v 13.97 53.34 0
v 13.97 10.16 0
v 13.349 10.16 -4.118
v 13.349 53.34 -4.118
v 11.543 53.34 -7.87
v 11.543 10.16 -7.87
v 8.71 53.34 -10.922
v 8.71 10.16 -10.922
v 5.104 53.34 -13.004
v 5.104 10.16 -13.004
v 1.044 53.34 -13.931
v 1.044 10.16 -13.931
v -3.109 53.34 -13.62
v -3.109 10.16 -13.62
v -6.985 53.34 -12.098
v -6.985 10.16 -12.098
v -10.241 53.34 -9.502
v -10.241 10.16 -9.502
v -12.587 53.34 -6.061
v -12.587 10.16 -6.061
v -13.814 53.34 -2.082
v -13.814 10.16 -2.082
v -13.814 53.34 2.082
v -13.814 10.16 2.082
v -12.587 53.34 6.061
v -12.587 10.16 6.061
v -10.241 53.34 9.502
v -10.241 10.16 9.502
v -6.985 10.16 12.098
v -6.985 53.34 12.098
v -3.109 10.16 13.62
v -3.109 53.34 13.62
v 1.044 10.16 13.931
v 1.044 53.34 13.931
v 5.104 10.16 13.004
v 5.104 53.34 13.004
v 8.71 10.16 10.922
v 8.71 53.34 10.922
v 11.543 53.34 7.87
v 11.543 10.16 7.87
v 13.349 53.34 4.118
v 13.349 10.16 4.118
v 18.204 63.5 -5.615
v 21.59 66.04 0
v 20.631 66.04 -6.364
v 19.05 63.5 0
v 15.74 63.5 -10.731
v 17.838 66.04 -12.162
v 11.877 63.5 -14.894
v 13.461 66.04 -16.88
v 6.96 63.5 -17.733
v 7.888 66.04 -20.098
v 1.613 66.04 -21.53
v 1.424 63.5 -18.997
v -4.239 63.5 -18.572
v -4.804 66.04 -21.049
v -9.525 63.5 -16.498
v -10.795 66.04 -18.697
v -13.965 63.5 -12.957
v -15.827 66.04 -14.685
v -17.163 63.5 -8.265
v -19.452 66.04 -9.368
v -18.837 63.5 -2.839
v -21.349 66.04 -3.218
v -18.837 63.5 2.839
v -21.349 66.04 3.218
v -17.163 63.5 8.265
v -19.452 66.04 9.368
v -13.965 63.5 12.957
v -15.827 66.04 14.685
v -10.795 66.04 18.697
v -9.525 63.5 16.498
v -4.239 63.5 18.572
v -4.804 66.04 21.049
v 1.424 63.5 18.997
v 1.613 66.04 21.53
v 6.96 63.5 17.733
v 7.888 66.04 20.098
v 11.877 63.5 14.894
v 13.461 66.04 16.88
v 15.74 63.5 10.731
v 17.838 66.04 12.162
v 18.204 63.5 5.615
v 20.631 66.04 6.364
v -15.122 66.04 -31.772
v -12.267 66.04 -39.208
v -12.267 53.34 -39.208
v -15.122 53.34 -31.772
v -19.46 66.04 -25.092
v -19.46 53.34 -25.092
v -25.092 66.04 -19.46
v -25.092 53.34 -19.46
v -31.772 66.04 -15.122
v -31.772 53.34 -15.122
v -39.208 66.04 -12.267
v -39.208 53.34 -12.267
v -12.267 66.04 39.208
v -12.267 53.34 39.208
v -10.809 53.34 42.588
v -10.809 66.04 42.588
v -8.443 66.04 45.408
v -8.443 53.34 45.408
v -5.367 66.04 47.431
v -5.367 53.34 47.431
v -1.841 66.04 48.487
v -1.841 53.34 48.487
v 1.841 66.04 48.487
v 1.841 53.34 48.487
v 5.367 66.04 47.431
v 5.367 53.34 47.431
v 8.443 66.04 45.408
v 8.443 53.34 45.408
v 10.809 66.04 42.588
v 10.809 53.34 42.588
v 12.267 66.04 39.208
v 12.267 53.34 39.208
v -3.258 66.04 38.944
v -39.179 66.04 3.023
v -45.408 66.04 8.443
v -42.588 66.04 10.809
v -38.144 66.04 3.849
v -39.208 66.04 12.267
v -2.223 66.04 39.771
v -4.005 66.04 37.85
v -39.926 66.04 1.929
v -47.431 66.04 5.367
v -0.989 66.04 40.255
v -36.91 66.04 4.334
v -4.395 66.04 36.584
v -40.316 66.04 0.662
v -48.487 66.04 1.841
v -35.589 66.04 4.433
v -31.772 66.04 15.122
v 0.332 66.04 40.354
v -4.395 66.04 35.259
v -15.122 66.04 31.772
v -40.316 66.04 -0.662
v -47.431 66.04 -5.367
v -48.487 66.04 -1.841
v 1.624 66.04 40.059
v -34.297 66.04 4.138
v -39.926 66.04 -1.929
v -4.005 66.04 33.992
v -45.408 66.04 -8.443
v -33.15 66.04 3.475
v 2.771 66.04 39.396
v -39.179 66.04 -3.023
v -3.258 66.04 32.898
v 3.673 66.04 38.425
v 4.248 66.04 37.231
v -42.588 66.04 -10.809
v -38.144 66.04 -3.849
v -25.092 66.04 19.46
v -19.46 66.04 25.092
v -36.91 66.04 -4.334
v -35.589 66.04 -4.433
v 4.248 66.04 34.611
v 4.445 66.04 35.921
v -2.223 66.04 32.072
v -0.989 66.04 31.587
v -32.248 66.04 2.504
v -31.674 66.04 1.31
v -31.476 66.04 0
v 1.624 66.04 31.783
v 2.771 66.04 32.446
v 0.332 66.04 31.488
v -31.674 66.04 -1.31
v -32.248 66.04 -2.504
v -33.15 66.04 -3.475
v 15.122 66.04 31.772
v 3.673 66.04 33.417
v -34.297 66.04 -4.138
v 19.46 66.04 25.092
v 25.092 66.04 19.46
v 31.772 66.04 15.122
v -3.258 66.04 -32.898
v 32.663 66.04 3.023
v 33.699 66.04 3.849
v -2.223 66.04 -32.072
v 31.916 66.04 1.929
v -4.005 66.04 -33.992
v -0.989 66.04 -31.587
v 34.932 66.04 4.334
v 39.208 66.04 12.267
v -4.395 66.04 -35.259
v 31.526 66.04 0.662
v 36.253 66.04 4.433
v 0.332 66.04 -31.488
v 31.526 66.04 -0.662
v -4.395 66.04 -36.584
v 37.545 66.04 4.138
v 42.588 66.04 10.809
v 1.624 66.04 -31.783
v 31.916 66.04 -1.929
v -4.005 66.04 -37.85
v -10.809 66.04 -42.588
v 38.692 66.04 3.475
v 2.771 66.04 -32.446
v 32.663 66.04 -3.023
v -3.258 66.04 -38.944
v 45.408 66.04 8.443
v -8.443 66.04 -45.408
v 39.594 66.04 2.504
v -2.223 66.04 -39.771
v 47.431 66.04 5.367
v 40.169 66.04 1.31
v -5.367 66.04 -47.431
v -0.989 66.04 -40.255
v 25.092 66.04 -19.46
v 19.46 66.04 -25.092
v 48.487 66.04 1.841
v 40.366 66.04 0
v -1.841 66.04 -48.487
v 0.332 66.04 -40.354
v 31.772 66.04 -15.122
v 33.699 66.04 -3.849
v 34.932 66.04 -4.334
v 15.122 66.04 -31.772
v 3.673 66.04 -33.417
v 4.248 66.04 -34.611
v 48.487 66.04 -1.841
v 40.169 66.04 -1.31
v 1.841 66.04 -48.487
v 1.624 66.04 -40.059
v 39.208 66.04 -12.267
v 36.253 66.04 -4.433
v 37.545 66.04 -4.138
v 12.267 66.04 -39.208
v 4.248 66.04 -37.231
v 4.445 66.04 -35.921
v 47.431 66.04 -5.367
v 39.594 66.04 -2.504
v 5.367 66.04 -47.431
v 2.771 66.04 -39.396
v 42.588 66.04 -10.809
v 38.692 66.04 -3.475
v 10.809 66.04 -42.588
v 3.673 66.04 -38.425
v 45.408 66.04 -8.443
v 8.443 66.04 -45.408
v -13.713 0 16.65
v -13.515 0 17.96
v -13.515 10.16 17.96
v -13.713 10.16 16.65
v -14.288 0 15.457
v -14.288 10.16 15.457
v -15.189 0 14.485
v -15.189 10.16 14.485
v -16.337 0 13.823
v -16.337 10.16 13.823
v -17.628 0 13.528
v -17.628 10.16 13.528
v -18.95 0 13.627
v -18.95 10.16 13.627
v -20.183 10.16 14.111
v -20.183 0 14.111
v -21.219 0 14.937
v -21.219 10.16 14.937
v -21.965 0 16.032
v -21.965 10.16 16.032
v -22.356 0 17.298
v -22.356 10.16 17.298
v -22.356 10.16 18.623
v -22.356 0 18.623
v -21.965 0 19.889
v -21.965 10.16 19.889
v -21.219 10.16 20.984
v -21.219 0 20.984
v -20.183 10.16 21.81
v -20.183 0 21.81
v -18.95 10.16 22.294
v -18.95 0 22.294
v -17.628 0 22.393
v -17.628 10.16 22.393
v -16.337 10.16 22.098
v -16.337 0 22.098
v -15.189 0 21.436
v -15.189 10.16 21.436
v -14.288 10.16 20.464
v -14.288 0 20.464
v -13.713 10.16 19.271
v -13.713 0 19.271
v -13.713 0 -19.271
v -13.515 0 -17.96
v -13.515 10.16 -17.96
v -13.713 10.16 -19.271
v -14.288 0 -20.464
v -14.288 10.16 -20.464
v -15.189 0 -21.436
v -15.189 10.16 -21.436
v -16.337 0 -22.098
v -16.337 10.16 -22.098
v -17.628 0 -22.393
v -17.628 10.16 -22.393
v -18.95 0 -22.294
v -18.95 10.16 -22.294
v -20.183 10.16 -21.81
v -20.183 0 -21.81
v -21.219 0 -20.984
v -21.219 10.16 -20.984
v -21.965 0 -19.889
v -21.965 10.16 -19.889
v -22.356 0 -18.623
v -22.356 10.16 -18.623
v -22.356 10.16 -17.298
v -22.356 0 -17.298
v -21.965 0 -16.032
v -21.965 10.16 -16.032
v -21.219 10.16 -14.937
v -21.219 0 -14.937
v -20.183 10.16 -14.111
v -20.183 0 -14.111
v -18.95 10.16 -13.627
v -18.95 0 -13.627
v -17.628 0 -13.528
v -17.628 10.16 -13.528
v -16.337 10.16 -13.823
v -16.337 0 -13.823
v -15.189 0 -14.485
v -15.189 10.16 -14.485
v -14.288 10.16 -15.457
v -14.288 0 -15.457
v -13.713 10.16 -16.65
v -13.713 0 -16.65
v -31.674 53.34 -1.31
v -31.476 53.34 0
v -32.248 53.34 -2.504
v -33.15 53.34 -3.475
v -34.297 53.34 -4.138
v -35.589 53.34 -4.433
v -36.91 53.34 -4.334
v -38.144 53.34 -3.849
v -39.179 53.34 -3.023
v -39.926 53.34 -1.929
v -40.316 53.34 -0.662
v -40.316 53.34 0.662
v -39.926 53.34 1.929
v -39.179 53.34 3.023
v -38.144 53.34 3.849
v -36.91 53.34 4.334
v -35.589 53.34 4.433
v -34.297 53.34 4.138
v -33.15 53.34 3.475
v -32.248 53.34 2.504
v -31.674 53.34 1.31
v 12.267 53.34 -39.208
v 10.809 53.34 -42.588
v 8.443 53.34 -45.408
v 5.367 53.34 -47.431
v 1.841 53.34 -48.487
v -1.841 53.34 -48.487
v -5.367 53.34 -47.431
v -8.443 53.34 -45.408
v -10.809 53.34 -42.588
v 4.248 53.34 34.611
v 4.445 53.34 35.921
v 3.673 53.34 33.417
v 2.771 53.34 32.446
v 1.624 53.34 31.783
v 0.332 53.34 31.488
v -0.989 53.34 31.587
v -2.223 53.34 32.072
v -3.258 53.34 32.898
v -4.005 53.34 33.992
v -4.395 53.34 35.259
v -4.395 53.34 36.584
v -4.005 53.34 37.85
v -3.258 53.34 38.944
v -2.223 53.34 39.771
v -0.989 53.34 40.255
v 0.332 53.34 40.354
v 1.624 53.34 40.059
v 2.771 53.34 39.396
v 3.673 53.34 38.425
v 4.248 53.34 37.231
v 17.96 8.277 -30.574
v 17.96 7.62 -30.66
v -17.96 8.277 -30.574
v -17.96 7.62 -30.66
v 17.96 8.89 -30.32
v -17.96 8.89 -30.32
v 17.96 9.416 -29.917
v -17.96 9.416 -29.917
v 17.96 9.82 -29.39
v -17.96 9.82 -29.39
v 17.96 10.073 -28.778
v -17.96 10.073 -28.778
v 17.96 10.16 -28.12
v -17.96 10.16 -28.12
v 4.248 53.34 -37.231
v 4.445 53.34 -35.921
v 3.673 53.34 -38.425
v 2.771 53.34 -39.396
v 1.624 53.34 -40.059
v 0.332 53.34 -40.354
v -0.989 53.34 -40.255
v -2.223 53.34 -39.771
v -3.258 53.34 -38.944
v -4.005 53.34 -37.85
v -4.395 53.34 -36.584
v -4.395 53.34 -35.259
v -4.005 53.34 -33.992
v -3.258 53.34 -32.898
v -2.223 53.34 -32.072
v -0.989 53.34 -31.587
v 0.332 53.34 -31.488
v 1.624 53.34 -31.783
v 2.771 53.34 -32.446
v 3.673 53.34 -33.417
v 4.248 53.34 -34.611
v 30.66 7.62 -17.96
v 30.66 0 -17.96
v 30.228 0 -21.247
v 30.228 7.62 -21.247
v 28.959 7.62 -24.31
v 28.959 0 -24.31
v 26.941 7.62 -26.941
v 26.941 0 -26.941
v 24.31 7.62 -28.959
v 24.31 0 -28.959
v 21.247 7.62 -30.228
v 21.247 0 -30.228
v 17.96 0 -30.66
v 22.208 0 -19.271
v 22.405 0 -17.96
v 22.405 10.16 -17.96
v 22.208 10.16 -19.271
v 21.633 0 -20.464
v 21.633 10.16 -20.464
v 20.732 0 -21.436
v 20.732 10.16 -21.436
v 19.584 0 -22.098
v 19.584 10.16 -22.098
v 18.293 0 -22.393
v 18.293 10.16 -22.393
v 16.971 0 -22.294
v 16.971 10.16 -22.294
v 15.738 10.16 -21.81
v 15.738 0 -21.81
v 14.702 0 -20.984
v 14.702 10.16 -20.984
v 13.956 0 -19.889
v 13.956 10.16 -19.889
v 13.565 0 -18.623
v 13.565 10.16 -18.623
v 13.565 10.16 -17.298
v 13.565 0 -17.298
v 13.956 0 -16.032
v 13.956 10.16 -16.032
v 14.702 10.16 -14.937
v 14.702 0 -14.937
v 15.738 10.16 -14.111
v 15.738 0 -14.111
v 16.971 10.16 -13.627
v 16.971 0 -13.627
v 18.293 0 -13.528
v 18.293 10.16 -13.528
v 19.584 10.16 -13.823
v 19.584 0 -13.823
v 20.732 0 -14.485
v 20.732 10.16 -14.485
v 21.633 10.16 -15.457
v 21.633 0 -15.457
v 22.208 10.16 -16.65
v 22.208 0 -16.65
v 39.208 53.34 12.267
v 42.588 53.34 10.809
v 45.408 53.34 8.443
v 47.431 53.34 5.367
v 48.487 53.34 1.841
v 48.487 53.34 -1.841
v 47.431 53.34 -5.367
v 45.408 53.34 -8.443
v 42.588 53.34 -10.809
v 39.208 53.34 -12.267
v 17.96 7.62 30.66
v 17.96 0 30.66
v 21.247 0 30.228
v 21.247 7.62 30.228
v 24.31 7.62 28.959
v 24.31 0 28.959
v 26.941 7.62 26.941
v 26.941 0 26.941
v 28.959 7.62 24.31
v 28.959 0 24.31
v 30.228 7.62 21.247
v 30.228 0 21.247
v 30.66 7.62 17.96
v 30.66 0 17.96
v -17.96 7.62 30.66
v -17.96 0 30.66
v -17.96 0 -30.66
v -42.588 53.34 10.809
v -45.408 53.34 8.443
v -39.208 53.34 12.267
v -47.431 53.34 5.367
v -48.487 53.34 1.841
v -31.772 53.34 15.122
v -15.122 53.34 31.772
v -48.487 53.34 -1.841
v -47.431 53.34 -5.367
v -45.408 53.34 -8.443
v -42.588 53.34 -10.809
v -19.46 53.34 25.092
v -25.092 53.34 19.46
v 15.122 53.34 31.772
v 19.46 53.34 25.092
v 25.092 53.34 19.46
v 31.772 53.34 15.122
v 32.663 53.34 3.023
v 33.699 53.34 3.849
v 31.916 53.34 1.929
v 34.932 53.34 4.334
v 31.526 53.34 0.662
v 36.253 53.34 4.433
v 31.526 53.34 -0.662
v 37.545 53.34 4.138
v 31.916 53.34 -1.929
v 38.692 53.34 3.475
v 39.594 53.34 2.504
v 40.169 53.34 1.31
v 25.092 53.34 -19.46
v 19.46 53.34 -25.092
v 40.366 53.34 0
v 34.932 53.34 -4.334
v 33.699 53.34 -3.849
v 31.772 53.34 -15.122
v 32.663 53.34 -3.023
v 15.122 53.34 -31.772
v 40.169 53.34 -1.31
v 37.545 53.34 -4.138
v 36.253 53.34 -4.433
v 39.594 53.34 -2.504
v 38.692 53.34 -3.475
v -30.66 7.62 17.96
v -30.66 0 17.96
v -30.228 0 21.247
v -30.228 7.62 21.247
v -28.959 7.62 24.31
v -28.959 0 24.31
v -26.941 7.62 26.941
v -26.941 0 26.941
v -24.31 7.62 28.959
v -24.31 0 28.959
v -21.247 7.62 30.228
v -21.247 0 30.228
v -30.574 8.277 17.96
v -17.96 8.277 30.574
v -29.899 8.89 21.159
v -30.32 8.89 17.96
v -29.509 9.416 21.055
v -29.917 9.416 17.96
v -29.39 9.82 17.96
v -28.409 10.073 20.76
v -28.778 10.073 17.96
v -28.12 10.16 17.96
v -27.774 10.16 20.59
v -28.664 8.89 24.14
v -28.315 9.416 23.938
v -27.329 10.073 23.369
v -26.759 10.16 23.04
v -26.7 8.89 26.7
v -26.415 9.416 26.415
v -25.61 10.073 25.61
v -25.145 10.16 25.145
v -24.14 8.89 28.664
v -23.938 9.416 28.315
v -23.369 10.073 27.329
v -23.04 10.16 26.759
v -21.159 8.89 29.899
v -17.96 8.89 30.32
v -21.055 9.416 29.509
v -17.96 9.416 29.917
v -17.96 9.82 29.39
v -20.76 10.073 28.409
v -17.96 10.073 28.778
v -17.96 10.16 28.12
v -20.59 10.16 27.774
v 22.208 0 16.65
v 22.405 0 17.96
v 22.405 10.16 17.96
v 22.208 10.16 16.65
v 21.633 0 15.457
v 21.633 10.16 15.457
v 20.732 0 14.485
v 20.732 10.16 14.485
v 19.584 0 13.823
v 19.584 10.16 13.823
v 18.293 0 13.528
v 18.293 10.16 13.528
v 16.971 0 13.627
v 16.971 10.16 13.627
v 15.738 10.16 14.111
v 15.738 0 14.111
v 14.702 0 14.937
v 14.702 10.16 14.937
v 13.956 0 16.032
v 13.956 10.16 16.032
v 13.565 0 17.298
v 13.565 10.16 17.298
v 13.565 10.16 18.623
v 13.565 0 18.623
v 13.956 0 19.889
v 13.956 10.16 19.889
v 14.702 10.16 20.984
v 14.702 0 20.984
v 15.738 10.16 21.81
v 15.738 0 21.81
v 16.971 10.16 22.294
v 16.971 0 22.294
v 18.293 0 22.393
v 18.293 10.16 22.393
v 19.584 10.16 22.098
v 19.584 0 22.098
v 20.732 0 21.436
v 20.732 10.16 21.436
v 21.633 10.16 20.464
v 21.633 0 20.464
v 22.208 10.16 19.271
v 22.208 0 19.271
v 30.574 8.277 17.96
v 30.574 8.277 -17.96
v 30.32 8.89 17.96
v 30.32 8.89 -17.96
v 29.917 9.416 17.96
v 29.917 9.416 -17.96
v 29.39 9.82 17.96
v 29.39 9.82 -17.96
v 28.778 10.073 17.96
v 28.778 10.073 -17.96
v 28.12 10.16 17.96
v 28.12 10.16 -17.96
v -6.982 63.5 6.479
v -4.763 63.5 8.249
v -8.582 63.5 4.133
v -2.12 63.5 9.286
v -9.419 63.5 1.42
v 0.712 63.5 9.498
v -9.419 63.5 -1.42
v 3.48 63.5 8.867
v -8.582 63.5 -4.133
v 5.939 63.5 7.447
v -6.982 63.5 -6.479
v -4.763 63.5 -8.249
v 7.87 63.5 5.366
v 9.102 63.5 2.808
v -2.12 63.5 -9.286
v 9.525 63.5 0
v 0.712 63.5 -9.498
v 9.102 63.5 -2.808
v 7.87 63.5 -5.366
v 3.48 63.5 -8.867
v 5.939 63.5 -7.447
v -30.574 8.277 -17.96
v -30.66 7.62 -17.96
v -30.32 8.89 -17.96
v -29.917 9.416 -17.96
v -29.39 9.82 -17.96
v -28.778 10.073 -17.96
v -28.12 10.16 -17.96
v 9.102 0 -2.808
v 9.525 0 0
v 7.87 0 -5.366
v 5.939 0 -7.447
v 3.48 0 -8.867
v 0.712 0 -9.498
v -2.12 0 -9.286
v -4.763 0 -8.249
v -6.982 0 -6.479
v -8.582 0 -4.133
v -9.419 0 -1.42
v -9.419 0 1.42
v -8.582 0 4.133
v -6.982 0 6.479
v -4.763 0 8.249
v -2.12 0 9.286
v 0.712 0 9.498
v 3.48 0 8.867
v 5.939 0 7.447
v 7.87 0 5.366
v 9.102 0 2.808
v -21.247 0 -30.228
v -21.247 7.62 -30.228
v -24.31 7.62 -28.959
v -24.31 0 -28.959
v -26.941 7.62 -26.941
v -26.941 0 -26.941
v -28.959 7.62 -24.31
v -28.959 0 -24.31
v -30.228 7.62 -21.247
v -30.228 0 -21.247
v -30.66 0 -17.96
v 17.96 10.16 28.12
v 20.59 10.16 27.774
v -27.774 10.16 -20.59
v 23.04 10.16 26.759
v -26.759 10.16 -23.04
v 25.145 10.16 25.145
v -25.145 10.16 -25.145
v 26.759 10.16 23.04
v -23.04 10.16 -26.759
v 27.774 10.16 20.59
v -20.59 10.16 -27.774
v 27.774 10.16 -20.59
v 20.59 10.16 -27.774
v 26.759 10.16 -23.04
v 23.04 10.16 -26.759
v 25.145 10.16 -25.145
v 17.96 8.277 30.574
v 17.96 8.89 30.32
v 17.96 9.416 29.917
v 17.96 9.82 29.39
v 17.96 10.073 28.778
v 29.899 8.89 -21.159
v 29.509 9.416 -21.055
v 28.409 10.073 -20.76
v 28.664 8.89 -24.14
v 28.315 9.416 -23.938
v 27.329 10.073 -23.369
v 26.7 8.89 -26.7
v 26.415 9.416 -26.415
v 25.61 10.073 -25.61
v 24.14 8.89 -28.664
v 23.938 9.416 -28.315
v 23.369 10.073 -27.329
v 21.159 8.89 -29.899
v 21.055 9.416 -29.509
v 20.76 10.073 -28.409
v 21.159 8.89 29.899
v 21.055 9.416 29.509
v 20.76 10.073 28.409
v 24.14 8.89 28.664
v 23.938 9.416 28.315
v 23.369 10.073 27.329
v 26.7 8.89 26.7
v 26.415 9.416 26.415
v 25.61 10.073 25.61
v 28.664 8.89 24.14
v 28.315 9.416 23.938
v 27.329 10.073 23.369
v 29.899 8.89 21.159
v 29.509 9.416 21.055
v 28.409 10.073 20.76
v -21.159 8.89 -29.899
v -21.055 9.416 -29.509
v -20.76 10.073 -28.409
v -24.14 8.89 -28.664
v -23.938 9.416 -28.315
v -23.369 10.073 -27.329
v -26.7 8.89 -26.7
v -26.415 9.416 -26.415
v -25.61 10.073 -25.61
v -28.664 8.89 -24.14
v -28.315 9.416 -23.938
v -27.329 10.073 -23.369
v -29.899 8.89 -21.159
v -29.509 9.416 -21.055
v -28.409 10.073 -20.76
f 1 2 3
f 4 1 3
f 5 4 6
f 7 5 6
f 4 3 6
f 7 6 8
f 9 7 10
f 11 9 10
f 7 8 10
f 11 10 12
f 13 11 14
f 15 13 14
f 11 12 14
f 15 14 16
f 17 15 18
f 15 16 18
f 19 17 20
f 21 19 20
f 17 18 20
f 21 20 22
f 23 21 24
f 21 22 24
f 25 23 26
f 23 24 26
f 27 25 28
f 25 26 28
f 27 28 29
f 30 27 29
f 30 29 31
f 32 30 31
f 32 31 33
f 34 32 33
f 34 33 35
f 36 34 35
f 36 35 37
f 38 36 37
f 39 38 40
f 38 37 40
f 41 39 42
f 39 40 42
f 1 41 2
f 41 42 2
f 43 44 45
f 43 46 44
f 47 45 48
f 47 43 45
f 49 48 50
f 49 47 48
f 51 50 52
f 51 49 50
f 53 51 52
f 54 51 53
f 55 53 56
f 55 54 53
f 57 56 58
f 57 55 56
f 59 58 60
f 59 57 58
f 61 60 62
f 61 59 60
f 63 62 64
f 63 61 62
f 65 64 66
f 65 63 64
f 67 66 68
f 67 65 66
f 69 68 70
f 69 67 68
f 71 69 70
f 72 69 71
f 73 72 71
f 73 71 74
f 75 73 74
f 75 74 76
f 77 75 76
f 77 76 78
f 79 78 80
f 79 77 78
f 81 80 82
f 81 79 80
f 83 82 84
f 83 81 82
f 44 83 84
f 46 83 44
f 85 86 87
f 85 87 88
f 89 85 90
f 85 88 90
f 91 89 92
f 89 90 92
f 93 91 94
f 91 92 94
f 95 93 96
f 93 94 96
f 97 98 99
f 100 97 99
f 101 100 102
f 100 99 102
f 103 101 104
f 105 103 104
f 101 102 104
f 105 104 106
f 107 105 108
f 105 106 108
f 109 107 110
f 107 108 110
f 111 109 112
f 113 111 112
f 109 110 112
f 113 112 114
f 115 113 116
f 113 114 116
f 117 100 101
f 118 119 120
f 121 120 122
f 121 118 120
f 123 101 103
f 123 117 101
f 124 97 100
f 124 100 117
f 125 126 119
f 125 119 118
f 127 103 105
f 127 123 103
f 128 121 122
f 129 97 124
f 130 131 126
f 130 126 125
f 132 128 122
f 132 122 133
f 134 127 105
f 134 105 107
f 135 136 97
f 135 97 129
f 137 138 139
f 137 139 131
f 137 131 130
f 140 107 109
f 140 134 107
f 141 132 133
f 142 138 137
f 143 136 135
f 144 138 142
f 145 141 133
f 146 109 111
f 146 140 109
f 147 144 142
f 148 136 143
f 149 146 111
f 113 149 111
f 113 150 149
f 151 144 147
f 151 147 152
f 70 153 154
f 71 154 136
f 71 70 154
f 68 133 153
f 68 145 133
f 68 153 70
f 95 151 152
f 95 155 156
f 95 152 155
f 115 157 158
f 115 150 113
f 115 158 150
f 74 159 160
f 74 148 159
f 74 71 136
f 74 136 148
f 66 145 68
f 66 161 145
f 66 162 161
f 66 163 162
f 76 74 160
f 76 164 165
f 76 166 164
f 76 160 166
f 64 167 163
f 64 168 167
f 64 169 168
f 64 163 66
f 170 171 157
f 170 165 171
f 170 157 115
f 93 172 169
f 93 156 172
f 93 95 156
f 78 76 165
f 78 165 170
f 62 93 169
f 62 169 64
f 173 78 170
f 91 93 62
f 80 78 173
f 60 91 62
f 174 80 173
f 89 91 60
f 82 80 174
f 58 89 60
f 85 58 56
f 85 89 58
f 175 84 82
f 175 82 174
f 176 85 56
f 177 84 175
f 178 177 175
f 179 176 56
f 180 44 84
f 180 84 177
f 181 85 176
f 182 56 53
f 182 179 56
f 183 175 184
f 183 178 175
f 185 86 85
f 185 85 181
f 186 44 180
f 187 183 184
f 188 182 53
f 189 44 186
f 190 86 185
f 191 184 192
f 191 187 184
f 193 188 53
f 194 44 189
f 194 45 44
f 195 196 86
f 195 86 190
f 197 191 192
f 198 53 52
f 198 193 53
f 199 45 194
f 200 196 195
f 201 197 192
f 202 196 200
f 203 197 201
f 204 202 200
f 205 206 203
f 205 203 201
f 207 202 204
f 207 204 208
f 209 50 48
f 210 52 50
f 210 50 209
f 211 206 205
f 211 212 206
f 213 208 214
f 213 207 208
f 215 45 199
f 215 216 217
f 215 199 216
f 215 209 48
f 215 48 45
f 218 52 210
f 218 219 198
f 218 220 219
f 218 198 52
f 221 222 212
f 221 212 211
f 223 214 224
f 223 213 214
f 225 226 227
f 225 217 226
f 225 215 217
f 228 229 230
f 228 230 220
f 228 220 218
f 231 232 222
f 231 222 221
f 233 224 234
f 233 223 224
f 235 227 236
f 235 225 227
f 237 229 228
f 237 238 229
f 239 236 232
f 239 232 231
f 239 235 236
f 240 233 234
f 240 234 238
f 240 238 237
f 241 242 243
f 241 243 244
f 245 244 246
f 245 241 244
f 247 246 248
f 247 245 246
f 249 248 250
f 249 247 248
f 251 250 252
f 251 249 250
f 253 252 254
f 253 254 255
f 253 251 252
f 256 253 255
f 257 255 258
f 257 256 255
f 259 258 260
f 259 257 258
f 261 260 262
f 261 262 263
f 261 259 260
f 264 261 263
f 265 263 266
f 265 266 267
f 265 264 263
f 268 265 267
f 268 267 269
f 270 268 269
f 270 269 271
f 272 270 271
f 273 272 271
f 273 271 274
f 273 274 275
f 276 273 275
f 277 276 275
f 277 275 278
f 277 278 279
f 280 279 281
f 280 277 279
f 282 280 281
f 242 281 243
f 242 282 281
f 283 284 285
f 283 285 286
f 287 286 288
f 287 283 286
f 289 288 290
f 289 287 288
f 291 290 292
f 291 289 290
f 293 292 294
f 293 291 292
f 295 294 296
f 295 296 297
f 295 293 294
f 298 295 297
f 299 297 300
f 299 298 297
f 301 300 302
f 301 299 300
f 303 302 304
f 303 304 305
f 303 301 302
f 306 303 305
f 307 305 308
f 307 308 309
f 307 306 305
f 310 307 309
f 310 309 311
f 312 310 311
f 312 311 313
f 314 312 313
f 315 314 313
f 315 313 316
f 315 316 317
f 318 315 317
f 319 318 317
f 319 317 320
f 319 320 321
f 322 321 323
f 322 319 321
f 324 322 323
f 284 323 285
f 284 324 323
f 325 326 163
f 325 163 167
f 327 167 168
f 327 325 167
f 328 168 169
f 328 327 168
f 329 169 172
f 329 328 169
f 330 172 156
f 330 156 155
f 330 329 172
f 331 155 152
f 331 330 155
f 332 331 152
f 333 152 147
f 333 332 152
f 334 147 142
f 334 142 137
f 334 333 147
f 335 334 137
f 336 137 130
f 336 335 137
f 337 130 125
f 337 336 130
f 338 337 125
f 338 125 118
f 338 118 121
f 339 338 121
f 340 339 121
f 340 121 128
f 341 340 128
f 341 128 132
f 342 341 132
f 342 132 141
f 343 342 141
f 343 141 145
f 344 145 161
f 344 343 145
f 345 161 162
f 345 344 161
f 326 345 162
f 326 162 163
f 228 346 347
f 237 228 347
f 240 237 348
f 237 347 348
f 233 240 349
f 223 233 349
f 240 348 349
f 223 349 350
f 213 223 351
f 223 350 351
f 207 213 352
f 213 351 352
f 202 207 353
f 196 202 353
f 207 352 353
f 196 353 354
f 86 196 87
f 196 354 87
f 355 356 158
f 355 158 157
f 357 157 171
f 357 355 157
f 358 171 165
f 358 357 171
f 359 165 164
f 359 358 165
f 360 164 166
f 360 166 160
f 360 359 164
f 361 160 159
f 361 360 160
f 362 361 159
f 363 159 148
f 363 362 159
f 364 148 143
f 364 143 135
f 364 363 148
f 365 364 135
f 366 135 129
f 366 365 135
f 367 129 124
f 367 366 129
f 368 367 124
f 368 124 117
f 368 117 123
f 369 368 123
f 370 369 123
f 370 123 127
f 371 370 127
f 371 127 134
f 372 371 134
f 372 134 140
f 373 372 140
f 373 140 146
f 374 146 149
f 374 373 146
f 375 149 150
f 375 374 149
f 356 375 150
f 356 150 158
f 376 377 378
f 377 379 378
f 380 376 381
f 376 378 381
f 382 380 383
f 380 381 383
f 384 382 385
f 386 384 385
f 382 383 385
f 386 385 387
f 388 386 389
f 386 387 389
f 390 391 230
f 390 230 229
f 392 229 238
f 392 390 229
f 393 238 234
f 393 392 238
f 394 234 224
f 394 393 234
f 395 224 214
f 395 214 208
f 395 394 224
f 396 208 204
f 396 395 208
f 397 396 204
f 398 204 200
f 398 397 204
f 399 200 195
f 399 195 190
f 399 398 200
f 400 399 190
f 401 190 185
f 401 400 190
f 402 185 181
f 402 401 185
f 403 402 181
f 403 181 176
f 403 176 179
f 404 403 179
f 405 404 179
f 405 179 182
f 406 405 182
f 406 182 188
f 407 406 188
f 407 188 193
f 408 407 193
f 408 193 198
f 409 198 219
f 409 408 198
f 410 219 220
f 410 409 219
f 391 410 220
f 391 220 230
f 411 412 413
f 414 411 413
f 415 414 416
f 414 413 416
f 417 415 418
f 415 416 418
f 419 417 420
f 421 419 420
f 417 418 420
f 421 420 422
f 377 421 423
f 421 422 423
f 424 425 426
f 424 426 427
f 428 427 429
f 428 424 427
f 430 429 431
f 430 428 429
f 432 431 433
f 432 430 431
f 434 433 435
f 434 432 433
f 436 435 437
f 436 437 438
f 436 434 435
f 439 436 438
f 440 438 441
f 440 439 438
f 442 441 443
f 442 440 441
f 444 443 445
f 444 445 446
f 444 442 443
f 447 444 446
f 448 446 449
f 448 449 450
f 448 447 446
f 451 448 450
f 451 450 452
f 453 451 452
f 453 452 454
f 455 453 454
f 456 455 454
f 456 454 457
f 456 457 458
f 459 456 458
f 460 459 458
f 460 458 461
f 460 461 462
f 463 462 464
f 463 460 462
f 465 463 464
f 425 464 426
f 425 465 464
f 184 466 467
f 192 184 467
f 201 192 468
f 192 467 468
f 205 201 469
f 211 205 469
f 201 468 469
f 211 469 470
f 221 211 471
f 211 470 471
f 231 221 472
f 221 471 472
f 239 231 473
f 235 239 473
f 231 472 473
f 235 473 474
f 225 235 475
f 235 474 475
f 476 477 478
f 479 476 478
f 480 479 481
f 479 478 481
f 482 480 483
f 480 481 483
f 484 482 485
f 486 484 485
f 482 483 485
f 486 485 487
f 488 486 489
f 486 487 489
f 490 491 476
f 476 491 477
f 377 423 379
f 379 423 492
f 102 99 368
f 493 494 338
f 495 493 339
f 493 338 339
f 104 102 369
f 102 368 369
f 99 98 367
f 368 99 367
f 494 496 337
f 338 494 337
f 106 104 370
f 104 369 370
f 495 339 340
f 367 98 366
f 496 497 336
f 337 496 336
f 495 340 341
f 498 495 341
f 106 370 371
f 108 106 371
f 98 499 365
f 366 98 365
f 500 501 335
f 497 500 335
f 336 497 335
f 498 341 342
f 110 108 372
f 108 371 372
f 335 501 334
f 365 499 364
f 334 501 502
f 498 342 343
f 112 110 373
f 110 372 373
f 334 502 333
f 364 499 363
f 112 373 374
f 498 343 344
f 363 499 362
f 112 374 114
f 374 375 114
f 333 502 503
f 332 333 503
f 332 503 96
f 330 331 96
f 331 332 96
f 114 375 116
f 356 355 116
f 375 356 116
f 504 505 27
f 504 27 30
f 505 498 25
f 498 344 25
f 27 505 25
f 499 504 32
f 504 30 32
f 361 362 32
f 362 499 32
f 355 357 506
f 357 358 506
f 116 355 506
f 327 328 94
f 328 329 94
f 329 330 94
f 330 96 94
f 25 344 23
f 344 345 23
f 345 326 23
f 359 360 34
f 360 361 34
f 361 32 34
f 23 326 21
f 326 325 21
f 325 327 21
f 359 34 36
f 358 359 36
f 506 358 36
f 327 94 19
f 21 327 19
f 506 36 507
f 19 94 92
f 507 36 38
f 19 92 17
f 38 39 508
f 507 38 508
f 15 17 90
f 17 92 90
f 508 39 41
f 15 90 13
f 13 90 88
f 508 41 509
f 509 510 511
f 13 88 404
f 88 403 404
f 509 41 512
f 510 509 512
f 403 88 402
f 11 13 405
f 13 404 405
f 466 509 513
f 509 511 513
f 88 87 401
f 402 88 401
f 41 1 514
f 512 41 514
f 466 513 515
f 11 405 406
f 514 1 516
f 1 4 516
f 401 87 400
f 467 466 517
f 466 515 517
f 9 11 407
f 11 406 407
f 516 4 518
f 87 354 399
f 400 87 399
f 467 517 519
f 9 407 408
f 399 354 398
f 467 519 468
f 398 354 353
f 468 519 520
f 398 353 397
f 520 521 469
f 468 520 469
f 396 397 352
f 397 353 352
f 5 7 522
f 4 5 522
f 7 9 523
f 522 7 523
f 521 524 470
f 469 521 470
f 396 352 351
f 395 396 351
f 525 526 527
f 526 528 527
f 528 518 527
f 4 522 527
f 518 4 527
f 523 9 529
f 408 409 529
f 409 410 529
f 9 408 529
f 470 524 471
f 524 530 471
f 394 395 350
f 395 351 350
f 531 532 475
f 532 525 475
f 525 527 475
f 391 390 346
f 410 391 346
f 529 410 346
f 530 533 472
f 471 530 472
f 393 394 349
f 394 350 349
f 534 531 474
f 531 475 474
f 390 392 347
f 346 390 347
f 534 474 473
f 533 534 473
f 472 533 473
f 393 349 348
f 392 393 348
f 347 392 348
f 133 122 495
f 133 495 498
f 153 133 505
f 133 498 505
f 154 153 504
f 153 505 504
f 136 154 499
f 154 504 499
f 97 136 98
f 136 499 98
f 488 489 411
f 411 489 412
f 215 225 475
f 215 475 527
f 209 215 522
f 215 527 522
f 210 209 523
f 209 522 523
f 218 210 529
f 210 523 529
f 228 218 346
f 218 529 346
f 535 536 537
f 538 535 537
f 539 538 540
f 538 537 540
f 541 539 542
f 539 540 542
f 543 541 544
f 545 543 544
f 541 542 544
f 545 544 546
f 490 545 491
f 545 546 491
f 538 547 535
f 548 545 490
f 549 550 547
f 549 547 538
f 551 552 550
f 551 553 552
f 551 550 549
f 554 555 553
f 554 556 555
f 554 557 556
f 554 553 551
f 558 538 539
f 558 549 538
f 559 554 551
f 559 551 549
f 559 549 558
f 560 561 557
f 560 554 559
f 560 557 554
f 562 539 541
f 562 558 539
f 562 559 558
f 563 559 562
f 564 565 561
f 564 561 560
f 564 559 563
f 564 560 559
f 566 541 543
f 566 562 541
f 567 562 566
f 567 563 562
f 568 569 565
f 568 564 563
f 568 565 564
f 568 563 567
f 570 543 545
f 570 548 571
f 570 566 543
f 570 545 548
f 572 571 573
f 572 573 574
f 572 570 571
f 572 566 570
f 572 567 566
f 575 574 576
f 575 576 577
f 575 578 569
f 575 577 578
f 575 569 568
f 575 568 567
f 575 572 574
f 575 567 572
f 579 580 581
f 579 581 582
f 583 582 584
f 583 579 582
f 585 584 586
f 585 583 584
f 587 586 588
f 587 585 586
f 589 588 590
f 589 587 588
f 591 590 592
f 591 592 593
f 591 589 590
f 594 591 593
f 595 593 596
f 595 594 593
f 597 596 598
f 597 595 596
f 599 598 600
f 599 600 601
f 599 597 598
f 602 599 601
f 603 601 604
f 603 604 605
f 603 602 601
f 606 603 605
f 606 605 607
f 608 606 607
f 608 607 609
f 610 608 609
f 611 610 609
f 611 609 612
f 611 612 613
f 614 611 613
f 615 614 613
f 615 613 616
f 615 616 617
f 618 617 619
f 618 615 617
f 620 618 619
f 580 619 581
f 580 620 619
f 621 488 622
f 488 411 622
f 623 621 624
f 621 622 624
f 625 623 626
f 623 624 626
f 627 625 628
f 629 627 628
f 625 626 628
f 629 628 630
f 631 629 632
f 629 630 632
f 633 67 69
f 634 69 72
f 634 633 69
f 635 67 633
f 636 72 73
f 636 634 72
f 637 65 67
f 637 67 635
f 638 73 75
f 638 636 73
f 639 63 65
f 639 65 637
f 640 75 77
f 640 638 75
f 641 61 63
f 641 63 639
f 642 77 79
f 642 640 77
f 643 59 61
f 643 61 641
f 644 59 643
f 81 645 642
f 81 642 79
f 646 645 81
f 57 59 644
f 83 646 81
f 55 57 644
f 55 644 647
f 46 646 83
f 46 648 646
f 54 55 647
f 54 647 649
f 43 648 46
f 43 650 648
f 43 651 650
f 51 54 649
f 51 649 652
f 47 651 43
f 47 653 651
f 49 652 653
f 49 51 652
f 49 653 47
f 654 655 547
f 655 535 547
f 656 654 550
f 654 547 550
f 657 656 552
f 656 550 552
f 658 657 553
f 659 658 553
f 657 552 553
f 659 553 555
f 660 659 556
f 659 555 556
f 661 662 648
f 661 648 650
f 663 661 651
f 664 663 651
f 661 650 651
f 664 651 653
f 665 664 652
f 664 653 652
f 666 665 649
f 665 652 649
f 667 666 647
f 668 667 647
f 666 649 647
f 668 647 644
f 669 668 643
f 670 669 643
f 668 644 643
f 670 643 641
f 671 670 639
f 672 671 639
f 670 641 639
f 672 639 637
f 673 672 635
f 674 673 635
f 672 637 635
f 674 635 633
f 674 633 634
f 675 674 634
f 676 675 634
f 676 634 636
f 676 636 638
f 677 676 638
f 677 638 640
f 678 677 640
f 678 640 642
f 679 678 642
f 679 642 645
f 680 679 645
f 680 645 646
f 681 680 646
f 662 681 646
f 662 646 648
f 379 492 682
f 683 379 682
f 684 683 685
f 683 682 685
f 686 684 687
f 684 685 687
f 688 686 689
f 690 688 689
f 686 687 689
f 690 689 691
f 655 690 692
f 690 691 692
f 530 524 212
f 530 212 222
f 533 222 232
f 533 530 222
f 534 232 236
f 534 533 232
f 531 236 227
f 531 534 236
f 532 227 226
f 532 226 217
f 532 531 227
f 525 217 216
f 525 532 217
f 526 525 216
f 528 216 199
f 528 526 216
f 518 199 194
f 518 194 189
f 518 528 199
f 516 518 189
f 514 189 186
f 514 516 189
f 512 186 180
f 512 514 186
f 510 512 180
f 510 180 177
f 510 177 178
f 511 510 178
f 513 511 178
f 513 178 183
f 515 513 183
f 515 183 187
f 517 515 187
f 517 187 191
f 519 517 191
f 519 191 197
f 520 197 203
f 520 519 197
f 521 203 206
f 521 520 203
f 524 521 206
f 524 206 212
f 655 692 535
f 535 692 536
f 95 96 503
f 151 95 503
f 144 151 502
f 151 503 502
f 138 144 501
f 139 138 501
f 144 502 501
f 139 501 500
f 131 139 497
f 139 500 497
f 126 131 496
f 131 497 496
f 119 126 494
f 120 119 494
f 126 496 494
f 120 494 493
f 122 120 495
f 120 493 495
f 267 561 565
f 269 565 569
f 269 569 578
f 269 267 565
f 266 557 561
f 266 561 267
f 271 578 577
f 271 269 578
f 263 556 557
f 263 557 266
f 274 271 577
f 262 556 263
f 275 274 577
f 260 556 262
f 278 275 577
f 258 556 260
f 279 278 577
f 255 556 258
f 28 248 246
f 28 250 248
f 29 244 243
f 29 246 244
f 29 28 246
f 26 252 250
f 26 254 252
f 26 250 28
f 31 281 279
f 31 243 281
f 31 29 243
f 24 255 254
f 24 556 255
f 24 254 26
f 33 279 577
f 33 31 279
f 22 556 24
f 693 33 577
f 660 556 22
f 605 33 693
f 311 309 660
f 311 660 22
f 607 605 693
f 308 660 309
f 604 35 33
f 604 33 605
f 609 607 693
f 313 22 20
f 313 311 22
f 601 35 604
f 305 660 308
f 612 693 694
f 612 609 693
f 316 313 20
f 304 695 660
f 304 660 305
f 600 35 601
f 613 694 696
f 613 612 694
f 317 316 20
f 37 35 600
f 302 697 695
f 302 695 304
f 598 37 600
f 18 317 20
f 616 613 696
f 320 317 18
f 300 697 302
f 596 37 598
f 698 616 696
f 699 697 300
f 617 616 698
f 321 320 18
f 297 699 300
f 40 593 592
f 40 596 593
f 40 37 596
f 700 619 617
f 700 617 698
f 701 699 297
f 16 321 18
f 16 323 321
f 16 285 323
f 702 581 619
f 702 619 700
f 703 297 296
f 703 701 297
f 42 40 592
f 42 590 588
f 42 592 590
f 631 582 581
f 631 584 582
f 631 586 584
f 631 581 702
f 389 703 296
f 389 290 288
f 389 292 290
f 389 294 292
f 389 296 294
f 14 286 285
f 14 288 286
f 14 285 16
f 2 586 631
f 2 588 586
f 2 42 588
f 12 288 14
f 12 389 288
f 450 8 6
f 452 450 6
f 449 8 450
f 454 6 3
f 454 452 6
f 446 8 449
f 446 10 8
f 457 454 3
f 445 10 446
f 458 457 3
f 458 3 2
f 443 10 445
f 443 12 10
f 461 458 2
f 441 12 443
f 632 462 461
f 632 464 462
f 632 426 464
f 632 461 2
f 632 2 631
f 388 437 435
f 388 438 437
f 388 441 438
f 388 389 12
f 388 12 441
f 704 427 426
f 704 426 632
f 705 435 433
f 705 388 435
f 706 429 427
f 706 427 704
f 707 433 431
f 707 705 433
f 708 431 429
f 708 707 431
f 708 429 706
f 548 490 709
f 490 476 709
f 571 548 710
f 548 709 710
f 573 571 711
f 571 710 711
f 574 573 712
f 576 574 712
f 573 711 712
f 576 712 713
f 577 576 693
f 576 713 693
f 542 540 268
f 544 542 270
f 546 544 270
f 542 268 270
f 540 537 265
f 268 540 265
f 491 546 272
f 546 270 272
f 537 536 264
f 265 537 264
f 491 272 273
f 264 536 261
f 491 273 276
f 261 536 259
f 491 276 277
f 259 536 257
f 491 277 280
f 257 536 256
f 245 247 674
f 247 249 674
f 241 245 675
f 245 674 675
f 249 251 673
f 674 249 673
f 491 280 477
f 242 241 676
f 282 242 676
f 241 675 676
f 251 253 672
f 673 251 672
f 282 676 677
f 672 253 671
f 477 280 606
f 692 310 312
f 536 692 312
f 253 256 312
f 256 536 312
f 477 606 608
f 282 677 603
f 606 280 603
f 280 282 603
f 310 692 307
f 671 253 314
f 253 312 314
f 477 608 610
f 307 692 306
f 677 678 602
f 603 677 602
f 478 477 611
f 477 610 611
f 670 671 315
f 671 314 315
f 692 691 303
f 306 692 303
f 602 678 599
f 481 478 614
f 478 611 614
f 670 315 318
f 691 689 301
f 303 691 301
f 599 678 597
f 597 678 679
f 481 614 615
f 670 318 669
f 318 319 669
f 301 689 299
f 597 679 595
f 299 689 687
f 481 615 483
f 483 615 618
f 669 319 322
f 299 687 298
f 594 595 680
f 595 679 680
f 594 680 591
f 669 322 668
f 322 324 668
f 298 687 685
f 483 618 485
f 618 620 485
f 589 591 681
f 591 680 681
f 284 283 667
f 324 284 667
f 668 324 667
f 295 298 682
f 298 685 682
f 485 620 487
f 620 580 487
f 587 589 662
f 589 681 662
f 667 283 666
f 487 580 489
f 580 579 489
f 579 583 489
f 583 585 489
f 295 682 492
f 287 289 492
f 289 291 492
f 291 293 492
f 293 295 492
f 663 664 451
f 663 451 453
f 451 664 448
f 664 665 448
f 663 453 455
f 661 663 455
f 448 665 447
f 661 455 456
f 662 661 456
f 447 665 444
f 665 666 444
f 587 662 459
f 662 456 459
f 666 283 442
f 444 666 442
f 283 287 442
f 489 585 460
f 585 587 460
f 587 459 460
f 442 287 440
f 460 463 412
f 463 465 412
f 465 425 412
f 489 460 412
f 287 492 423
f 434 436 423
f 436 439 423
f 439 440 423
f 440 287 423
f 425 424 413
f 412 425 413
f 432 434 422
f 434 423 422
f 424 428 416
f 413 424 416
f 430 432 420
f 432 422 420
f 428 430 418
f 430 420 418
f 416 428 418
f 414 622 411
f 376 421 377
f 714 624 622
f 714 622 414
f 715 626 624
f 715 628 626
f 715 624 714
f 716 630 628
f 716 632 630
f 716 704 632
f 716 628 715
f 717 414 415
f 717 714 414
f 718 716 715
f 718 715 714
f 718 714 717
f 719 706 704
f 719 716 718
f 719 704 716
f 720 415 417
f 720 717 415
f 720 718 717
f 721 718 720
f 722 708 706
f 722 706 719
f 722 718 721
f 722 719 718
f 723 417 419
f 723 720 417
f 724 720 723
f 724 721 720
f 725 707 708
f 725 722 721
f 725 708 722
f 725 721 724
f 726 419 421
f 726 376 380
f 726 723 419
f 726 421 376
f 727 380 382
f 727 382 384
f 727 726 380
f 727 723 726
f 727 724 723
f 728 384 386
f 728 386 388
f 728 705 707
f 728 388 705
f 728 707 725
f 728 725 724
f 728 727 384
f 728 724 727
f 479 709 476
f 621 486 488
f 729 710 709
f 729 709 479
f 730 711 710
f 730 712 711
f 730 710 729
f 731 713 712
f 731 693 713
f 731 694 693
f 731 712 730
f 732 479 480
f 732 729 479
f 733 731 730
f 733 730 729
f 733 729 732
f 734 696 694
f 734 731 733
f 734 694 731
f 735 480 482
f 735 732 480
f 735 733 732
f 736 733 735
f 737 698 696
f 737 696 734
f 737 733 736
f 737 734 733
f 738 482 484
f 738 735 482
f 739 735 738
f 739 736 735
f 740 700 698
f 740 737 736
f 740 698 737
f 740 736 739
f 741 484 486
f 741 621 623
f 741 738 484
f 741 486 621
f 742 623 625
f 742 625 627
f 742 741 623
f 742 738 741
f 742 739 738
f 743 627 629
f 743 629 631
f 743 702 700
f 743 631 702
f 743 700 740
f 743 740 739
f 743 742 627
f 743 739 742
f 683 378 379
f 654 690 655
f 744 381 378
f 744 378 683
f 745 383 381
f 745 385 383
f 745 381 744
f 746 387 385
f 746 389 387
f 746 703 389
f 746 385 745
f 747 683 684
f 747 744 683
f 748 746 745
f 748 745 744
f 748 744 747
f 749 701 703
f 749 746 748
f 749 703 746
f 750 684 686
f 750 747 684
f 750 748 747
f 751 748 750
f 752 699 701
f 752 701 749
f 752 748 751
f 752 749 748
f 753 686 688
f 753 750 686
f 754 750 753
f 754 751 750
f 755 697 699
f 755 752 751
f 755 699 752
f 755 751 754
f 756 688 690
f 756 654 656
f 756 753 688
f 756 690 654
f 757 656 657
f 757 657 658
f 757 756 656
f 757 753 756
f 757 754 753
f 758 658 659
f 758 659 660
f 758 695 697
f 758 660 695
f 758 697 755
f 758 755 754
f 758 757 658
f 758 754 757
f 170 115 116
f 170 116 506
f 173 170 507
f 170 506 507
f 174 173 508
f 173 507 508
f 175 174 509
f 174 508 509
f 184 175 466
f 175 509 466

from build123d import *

# Parameters (mm, degrees)
SKETCH1_R           = 4.445
BOSS_EXTRUDE1_DEPTH = 10.16
FILLET1_R           = 2.54
SKETCH2_R           = 13.97
BOSS_EXTRUDE2_DEPTH = 43.18
SKETCH10_R          = 4.445
BOSS_EXTRUDE3_DEPTH = 12.7
SKETCH11_R          = 9.525
CUT_EXTRUDE1_DEPTH  = 67.04


with BuildPart() as part:
    # Sketch1 → Boss-Extrude1 (new body)
    with BuildSketch(Plane(origin=(0, 0, 0), x_dir=(1, 0, 0), z_dir=(0, 1, 0))):
        with BuildLine():
            Line((-17.960467, -30.660467), (17.960467, -30.660467))
            ThreePointArc((17.960467, -30.660467), (26.940723121, -26.940723121), (30.660467, -17.960467))
            Line((30.660467, -17.960467), (30.660467, 17.960467))
            ThreePointArc((30.660467, 17.960467), (26.940723121, 26.940723121), (17.960467, 30.660467))
            Line((17.960467, 30.660467), (-17.960467, 30.660467))
            ThreePointArc((-17.960467, 30.660467), (-26.940723121, 26.940723121), (-30.660467, 17.960467))
            Line((-30.660467, 17.960467), (-30.660467, -17.960467))
            ThreePointArc((-30.660467, -17.960467), (-26.940723121, -26.940723121), (-17.960467, -30.660467))
        make_face()
        with Locations((-17.960467, 17.960467)):
            Circle(SKETCH1_R, mode=Mode.SUBTRACT)
        with Locations((17.960467, 17.960467)):
            Circle(SKETCH1_R, mode=Mode.SUBTRACT)
        with Locations((-17.960467, -17.960467)):
            Circle(SKETCH1_R, mode=Mode.SUBTRACT)
        with Locations((17.960467, -17.960467)):
            Circle(SKETCH1_R, mode=Mode.SUBTRACT)
    extrude(amount=BOSS_EXTRUDE1_DEPTH)

    # Fillet1
    fillet1_edges = [part.edges().sort_by_distance(p)[0] for p in [
        (26.940723121, 10.16, 26.940723121),
        (30.660467, 10.16, 0),
        (26.940723121, 10.16, -26.940723121),
        (0, 10.16, -30.660467),
        (-26.940723121, 10.16, -26.940723121),
        (-30.660467, 10.16, 0),
        (-26.940723121, 10.16, 26.940723121),
        (0, 10.16, 30.660467),
    ]]
    fillet(fillet1_edges, radius=FILLET1_R)

    # Sketch2 → Boss-Extrude2 (add)
    with BuildSketch(Plane(origin=(0, 10.16, 0), x_dir=(1, 0, 0), z_dir=(0, 1, 0))):
        Circle(SKETCH2_R)
    extrude(amount=BOSS_EXTRUDE2_DEPTH)

    # Sketch10 → Boss-Extrude3 (add)
    with BuildSketch(Plane(origin=(0, 53.34, 0), x_dir=(1, 0, 0), z_dir=(0, 1, 0))):
        with BuildLine():
            ThreePointArc((-39.208026357, 12.267257994), (-48.621024484, 0), (-39.208026357, -12.267257994))
            ThreePointArc((-39.208026357, -12.267257994), (-22.128263612, -22.128263612), (-12.267257994, -39.208026357))
            ThreePointArc((-12.267257994, -39.208026357), (0, -48.621024484), (12.267257994, -39.208026357))
            ThreePointArc((12.267257994, -39.208026357), (22.128263612, -22.128263612), (39.208026357, -12.267257994))
            ThreePointArc((39.208026357, -12.267257994), (48.621024484, 0), (39.208026357, 12.267257994))
            ThreePointArc((39.208026357, 12.267257994), (22.128263612, 22.128263612), (12.267257994, 39.208026357))
            ThreePointArc((12.267257994, 39.208026357), (0, 48.621024484), (-12.267257994, 39.208026357))
            ThreePointArc((-12.267257994, 39.208026357), (-22.128263612, 22.128263612), (-39.208026357, 12.267257994))
        make_face()
        with Locations((-35.921024484, 0)):
            Circle(SKETCH10_R, mode=Mode.SUBTRACT)
        with Locations((0, 35.921024484)):
            Circle(SKETCH10_R, mode=Mode.SUBTRACT)
        with Locations((35.921024484, 0)):
            Circle(SKETCH10_R, mode=Mode.SUBTRACT)
        with Locations((0, -35.921024484)):
            Circle(SKETCH10_R, mode=Mode.SUBTRACT)
    extrude(amount=BOSS_EXTRUDE3_DEPTH)

    # Sketch11 → Cut-Extrude1 (cut, through all)
    with BuildSketch(Plane(origin=(0, 66.04, 0), x_dir=(1, 0, 0), z_dir=(0, 1, 0))):
        Circle(SKETCH11_R)
    extrude(amount=-CUT_EXTRUDE1_DEPTH, mode=Mode.SUBTRACT)

    # Sketch13 → Cut-Revolve1 (revolve, cut)
    with BuildSketch(Plane.XY):
        Polygon((21.59, 66.04), (19.05, 63.5), (0, 63.5), (0, 66.04), align=None)
    revolve(axis=Axis((0, 63.5, 0), (0, 1, 0)), mode=Mode.SUBTRACT)


solid = part.part
